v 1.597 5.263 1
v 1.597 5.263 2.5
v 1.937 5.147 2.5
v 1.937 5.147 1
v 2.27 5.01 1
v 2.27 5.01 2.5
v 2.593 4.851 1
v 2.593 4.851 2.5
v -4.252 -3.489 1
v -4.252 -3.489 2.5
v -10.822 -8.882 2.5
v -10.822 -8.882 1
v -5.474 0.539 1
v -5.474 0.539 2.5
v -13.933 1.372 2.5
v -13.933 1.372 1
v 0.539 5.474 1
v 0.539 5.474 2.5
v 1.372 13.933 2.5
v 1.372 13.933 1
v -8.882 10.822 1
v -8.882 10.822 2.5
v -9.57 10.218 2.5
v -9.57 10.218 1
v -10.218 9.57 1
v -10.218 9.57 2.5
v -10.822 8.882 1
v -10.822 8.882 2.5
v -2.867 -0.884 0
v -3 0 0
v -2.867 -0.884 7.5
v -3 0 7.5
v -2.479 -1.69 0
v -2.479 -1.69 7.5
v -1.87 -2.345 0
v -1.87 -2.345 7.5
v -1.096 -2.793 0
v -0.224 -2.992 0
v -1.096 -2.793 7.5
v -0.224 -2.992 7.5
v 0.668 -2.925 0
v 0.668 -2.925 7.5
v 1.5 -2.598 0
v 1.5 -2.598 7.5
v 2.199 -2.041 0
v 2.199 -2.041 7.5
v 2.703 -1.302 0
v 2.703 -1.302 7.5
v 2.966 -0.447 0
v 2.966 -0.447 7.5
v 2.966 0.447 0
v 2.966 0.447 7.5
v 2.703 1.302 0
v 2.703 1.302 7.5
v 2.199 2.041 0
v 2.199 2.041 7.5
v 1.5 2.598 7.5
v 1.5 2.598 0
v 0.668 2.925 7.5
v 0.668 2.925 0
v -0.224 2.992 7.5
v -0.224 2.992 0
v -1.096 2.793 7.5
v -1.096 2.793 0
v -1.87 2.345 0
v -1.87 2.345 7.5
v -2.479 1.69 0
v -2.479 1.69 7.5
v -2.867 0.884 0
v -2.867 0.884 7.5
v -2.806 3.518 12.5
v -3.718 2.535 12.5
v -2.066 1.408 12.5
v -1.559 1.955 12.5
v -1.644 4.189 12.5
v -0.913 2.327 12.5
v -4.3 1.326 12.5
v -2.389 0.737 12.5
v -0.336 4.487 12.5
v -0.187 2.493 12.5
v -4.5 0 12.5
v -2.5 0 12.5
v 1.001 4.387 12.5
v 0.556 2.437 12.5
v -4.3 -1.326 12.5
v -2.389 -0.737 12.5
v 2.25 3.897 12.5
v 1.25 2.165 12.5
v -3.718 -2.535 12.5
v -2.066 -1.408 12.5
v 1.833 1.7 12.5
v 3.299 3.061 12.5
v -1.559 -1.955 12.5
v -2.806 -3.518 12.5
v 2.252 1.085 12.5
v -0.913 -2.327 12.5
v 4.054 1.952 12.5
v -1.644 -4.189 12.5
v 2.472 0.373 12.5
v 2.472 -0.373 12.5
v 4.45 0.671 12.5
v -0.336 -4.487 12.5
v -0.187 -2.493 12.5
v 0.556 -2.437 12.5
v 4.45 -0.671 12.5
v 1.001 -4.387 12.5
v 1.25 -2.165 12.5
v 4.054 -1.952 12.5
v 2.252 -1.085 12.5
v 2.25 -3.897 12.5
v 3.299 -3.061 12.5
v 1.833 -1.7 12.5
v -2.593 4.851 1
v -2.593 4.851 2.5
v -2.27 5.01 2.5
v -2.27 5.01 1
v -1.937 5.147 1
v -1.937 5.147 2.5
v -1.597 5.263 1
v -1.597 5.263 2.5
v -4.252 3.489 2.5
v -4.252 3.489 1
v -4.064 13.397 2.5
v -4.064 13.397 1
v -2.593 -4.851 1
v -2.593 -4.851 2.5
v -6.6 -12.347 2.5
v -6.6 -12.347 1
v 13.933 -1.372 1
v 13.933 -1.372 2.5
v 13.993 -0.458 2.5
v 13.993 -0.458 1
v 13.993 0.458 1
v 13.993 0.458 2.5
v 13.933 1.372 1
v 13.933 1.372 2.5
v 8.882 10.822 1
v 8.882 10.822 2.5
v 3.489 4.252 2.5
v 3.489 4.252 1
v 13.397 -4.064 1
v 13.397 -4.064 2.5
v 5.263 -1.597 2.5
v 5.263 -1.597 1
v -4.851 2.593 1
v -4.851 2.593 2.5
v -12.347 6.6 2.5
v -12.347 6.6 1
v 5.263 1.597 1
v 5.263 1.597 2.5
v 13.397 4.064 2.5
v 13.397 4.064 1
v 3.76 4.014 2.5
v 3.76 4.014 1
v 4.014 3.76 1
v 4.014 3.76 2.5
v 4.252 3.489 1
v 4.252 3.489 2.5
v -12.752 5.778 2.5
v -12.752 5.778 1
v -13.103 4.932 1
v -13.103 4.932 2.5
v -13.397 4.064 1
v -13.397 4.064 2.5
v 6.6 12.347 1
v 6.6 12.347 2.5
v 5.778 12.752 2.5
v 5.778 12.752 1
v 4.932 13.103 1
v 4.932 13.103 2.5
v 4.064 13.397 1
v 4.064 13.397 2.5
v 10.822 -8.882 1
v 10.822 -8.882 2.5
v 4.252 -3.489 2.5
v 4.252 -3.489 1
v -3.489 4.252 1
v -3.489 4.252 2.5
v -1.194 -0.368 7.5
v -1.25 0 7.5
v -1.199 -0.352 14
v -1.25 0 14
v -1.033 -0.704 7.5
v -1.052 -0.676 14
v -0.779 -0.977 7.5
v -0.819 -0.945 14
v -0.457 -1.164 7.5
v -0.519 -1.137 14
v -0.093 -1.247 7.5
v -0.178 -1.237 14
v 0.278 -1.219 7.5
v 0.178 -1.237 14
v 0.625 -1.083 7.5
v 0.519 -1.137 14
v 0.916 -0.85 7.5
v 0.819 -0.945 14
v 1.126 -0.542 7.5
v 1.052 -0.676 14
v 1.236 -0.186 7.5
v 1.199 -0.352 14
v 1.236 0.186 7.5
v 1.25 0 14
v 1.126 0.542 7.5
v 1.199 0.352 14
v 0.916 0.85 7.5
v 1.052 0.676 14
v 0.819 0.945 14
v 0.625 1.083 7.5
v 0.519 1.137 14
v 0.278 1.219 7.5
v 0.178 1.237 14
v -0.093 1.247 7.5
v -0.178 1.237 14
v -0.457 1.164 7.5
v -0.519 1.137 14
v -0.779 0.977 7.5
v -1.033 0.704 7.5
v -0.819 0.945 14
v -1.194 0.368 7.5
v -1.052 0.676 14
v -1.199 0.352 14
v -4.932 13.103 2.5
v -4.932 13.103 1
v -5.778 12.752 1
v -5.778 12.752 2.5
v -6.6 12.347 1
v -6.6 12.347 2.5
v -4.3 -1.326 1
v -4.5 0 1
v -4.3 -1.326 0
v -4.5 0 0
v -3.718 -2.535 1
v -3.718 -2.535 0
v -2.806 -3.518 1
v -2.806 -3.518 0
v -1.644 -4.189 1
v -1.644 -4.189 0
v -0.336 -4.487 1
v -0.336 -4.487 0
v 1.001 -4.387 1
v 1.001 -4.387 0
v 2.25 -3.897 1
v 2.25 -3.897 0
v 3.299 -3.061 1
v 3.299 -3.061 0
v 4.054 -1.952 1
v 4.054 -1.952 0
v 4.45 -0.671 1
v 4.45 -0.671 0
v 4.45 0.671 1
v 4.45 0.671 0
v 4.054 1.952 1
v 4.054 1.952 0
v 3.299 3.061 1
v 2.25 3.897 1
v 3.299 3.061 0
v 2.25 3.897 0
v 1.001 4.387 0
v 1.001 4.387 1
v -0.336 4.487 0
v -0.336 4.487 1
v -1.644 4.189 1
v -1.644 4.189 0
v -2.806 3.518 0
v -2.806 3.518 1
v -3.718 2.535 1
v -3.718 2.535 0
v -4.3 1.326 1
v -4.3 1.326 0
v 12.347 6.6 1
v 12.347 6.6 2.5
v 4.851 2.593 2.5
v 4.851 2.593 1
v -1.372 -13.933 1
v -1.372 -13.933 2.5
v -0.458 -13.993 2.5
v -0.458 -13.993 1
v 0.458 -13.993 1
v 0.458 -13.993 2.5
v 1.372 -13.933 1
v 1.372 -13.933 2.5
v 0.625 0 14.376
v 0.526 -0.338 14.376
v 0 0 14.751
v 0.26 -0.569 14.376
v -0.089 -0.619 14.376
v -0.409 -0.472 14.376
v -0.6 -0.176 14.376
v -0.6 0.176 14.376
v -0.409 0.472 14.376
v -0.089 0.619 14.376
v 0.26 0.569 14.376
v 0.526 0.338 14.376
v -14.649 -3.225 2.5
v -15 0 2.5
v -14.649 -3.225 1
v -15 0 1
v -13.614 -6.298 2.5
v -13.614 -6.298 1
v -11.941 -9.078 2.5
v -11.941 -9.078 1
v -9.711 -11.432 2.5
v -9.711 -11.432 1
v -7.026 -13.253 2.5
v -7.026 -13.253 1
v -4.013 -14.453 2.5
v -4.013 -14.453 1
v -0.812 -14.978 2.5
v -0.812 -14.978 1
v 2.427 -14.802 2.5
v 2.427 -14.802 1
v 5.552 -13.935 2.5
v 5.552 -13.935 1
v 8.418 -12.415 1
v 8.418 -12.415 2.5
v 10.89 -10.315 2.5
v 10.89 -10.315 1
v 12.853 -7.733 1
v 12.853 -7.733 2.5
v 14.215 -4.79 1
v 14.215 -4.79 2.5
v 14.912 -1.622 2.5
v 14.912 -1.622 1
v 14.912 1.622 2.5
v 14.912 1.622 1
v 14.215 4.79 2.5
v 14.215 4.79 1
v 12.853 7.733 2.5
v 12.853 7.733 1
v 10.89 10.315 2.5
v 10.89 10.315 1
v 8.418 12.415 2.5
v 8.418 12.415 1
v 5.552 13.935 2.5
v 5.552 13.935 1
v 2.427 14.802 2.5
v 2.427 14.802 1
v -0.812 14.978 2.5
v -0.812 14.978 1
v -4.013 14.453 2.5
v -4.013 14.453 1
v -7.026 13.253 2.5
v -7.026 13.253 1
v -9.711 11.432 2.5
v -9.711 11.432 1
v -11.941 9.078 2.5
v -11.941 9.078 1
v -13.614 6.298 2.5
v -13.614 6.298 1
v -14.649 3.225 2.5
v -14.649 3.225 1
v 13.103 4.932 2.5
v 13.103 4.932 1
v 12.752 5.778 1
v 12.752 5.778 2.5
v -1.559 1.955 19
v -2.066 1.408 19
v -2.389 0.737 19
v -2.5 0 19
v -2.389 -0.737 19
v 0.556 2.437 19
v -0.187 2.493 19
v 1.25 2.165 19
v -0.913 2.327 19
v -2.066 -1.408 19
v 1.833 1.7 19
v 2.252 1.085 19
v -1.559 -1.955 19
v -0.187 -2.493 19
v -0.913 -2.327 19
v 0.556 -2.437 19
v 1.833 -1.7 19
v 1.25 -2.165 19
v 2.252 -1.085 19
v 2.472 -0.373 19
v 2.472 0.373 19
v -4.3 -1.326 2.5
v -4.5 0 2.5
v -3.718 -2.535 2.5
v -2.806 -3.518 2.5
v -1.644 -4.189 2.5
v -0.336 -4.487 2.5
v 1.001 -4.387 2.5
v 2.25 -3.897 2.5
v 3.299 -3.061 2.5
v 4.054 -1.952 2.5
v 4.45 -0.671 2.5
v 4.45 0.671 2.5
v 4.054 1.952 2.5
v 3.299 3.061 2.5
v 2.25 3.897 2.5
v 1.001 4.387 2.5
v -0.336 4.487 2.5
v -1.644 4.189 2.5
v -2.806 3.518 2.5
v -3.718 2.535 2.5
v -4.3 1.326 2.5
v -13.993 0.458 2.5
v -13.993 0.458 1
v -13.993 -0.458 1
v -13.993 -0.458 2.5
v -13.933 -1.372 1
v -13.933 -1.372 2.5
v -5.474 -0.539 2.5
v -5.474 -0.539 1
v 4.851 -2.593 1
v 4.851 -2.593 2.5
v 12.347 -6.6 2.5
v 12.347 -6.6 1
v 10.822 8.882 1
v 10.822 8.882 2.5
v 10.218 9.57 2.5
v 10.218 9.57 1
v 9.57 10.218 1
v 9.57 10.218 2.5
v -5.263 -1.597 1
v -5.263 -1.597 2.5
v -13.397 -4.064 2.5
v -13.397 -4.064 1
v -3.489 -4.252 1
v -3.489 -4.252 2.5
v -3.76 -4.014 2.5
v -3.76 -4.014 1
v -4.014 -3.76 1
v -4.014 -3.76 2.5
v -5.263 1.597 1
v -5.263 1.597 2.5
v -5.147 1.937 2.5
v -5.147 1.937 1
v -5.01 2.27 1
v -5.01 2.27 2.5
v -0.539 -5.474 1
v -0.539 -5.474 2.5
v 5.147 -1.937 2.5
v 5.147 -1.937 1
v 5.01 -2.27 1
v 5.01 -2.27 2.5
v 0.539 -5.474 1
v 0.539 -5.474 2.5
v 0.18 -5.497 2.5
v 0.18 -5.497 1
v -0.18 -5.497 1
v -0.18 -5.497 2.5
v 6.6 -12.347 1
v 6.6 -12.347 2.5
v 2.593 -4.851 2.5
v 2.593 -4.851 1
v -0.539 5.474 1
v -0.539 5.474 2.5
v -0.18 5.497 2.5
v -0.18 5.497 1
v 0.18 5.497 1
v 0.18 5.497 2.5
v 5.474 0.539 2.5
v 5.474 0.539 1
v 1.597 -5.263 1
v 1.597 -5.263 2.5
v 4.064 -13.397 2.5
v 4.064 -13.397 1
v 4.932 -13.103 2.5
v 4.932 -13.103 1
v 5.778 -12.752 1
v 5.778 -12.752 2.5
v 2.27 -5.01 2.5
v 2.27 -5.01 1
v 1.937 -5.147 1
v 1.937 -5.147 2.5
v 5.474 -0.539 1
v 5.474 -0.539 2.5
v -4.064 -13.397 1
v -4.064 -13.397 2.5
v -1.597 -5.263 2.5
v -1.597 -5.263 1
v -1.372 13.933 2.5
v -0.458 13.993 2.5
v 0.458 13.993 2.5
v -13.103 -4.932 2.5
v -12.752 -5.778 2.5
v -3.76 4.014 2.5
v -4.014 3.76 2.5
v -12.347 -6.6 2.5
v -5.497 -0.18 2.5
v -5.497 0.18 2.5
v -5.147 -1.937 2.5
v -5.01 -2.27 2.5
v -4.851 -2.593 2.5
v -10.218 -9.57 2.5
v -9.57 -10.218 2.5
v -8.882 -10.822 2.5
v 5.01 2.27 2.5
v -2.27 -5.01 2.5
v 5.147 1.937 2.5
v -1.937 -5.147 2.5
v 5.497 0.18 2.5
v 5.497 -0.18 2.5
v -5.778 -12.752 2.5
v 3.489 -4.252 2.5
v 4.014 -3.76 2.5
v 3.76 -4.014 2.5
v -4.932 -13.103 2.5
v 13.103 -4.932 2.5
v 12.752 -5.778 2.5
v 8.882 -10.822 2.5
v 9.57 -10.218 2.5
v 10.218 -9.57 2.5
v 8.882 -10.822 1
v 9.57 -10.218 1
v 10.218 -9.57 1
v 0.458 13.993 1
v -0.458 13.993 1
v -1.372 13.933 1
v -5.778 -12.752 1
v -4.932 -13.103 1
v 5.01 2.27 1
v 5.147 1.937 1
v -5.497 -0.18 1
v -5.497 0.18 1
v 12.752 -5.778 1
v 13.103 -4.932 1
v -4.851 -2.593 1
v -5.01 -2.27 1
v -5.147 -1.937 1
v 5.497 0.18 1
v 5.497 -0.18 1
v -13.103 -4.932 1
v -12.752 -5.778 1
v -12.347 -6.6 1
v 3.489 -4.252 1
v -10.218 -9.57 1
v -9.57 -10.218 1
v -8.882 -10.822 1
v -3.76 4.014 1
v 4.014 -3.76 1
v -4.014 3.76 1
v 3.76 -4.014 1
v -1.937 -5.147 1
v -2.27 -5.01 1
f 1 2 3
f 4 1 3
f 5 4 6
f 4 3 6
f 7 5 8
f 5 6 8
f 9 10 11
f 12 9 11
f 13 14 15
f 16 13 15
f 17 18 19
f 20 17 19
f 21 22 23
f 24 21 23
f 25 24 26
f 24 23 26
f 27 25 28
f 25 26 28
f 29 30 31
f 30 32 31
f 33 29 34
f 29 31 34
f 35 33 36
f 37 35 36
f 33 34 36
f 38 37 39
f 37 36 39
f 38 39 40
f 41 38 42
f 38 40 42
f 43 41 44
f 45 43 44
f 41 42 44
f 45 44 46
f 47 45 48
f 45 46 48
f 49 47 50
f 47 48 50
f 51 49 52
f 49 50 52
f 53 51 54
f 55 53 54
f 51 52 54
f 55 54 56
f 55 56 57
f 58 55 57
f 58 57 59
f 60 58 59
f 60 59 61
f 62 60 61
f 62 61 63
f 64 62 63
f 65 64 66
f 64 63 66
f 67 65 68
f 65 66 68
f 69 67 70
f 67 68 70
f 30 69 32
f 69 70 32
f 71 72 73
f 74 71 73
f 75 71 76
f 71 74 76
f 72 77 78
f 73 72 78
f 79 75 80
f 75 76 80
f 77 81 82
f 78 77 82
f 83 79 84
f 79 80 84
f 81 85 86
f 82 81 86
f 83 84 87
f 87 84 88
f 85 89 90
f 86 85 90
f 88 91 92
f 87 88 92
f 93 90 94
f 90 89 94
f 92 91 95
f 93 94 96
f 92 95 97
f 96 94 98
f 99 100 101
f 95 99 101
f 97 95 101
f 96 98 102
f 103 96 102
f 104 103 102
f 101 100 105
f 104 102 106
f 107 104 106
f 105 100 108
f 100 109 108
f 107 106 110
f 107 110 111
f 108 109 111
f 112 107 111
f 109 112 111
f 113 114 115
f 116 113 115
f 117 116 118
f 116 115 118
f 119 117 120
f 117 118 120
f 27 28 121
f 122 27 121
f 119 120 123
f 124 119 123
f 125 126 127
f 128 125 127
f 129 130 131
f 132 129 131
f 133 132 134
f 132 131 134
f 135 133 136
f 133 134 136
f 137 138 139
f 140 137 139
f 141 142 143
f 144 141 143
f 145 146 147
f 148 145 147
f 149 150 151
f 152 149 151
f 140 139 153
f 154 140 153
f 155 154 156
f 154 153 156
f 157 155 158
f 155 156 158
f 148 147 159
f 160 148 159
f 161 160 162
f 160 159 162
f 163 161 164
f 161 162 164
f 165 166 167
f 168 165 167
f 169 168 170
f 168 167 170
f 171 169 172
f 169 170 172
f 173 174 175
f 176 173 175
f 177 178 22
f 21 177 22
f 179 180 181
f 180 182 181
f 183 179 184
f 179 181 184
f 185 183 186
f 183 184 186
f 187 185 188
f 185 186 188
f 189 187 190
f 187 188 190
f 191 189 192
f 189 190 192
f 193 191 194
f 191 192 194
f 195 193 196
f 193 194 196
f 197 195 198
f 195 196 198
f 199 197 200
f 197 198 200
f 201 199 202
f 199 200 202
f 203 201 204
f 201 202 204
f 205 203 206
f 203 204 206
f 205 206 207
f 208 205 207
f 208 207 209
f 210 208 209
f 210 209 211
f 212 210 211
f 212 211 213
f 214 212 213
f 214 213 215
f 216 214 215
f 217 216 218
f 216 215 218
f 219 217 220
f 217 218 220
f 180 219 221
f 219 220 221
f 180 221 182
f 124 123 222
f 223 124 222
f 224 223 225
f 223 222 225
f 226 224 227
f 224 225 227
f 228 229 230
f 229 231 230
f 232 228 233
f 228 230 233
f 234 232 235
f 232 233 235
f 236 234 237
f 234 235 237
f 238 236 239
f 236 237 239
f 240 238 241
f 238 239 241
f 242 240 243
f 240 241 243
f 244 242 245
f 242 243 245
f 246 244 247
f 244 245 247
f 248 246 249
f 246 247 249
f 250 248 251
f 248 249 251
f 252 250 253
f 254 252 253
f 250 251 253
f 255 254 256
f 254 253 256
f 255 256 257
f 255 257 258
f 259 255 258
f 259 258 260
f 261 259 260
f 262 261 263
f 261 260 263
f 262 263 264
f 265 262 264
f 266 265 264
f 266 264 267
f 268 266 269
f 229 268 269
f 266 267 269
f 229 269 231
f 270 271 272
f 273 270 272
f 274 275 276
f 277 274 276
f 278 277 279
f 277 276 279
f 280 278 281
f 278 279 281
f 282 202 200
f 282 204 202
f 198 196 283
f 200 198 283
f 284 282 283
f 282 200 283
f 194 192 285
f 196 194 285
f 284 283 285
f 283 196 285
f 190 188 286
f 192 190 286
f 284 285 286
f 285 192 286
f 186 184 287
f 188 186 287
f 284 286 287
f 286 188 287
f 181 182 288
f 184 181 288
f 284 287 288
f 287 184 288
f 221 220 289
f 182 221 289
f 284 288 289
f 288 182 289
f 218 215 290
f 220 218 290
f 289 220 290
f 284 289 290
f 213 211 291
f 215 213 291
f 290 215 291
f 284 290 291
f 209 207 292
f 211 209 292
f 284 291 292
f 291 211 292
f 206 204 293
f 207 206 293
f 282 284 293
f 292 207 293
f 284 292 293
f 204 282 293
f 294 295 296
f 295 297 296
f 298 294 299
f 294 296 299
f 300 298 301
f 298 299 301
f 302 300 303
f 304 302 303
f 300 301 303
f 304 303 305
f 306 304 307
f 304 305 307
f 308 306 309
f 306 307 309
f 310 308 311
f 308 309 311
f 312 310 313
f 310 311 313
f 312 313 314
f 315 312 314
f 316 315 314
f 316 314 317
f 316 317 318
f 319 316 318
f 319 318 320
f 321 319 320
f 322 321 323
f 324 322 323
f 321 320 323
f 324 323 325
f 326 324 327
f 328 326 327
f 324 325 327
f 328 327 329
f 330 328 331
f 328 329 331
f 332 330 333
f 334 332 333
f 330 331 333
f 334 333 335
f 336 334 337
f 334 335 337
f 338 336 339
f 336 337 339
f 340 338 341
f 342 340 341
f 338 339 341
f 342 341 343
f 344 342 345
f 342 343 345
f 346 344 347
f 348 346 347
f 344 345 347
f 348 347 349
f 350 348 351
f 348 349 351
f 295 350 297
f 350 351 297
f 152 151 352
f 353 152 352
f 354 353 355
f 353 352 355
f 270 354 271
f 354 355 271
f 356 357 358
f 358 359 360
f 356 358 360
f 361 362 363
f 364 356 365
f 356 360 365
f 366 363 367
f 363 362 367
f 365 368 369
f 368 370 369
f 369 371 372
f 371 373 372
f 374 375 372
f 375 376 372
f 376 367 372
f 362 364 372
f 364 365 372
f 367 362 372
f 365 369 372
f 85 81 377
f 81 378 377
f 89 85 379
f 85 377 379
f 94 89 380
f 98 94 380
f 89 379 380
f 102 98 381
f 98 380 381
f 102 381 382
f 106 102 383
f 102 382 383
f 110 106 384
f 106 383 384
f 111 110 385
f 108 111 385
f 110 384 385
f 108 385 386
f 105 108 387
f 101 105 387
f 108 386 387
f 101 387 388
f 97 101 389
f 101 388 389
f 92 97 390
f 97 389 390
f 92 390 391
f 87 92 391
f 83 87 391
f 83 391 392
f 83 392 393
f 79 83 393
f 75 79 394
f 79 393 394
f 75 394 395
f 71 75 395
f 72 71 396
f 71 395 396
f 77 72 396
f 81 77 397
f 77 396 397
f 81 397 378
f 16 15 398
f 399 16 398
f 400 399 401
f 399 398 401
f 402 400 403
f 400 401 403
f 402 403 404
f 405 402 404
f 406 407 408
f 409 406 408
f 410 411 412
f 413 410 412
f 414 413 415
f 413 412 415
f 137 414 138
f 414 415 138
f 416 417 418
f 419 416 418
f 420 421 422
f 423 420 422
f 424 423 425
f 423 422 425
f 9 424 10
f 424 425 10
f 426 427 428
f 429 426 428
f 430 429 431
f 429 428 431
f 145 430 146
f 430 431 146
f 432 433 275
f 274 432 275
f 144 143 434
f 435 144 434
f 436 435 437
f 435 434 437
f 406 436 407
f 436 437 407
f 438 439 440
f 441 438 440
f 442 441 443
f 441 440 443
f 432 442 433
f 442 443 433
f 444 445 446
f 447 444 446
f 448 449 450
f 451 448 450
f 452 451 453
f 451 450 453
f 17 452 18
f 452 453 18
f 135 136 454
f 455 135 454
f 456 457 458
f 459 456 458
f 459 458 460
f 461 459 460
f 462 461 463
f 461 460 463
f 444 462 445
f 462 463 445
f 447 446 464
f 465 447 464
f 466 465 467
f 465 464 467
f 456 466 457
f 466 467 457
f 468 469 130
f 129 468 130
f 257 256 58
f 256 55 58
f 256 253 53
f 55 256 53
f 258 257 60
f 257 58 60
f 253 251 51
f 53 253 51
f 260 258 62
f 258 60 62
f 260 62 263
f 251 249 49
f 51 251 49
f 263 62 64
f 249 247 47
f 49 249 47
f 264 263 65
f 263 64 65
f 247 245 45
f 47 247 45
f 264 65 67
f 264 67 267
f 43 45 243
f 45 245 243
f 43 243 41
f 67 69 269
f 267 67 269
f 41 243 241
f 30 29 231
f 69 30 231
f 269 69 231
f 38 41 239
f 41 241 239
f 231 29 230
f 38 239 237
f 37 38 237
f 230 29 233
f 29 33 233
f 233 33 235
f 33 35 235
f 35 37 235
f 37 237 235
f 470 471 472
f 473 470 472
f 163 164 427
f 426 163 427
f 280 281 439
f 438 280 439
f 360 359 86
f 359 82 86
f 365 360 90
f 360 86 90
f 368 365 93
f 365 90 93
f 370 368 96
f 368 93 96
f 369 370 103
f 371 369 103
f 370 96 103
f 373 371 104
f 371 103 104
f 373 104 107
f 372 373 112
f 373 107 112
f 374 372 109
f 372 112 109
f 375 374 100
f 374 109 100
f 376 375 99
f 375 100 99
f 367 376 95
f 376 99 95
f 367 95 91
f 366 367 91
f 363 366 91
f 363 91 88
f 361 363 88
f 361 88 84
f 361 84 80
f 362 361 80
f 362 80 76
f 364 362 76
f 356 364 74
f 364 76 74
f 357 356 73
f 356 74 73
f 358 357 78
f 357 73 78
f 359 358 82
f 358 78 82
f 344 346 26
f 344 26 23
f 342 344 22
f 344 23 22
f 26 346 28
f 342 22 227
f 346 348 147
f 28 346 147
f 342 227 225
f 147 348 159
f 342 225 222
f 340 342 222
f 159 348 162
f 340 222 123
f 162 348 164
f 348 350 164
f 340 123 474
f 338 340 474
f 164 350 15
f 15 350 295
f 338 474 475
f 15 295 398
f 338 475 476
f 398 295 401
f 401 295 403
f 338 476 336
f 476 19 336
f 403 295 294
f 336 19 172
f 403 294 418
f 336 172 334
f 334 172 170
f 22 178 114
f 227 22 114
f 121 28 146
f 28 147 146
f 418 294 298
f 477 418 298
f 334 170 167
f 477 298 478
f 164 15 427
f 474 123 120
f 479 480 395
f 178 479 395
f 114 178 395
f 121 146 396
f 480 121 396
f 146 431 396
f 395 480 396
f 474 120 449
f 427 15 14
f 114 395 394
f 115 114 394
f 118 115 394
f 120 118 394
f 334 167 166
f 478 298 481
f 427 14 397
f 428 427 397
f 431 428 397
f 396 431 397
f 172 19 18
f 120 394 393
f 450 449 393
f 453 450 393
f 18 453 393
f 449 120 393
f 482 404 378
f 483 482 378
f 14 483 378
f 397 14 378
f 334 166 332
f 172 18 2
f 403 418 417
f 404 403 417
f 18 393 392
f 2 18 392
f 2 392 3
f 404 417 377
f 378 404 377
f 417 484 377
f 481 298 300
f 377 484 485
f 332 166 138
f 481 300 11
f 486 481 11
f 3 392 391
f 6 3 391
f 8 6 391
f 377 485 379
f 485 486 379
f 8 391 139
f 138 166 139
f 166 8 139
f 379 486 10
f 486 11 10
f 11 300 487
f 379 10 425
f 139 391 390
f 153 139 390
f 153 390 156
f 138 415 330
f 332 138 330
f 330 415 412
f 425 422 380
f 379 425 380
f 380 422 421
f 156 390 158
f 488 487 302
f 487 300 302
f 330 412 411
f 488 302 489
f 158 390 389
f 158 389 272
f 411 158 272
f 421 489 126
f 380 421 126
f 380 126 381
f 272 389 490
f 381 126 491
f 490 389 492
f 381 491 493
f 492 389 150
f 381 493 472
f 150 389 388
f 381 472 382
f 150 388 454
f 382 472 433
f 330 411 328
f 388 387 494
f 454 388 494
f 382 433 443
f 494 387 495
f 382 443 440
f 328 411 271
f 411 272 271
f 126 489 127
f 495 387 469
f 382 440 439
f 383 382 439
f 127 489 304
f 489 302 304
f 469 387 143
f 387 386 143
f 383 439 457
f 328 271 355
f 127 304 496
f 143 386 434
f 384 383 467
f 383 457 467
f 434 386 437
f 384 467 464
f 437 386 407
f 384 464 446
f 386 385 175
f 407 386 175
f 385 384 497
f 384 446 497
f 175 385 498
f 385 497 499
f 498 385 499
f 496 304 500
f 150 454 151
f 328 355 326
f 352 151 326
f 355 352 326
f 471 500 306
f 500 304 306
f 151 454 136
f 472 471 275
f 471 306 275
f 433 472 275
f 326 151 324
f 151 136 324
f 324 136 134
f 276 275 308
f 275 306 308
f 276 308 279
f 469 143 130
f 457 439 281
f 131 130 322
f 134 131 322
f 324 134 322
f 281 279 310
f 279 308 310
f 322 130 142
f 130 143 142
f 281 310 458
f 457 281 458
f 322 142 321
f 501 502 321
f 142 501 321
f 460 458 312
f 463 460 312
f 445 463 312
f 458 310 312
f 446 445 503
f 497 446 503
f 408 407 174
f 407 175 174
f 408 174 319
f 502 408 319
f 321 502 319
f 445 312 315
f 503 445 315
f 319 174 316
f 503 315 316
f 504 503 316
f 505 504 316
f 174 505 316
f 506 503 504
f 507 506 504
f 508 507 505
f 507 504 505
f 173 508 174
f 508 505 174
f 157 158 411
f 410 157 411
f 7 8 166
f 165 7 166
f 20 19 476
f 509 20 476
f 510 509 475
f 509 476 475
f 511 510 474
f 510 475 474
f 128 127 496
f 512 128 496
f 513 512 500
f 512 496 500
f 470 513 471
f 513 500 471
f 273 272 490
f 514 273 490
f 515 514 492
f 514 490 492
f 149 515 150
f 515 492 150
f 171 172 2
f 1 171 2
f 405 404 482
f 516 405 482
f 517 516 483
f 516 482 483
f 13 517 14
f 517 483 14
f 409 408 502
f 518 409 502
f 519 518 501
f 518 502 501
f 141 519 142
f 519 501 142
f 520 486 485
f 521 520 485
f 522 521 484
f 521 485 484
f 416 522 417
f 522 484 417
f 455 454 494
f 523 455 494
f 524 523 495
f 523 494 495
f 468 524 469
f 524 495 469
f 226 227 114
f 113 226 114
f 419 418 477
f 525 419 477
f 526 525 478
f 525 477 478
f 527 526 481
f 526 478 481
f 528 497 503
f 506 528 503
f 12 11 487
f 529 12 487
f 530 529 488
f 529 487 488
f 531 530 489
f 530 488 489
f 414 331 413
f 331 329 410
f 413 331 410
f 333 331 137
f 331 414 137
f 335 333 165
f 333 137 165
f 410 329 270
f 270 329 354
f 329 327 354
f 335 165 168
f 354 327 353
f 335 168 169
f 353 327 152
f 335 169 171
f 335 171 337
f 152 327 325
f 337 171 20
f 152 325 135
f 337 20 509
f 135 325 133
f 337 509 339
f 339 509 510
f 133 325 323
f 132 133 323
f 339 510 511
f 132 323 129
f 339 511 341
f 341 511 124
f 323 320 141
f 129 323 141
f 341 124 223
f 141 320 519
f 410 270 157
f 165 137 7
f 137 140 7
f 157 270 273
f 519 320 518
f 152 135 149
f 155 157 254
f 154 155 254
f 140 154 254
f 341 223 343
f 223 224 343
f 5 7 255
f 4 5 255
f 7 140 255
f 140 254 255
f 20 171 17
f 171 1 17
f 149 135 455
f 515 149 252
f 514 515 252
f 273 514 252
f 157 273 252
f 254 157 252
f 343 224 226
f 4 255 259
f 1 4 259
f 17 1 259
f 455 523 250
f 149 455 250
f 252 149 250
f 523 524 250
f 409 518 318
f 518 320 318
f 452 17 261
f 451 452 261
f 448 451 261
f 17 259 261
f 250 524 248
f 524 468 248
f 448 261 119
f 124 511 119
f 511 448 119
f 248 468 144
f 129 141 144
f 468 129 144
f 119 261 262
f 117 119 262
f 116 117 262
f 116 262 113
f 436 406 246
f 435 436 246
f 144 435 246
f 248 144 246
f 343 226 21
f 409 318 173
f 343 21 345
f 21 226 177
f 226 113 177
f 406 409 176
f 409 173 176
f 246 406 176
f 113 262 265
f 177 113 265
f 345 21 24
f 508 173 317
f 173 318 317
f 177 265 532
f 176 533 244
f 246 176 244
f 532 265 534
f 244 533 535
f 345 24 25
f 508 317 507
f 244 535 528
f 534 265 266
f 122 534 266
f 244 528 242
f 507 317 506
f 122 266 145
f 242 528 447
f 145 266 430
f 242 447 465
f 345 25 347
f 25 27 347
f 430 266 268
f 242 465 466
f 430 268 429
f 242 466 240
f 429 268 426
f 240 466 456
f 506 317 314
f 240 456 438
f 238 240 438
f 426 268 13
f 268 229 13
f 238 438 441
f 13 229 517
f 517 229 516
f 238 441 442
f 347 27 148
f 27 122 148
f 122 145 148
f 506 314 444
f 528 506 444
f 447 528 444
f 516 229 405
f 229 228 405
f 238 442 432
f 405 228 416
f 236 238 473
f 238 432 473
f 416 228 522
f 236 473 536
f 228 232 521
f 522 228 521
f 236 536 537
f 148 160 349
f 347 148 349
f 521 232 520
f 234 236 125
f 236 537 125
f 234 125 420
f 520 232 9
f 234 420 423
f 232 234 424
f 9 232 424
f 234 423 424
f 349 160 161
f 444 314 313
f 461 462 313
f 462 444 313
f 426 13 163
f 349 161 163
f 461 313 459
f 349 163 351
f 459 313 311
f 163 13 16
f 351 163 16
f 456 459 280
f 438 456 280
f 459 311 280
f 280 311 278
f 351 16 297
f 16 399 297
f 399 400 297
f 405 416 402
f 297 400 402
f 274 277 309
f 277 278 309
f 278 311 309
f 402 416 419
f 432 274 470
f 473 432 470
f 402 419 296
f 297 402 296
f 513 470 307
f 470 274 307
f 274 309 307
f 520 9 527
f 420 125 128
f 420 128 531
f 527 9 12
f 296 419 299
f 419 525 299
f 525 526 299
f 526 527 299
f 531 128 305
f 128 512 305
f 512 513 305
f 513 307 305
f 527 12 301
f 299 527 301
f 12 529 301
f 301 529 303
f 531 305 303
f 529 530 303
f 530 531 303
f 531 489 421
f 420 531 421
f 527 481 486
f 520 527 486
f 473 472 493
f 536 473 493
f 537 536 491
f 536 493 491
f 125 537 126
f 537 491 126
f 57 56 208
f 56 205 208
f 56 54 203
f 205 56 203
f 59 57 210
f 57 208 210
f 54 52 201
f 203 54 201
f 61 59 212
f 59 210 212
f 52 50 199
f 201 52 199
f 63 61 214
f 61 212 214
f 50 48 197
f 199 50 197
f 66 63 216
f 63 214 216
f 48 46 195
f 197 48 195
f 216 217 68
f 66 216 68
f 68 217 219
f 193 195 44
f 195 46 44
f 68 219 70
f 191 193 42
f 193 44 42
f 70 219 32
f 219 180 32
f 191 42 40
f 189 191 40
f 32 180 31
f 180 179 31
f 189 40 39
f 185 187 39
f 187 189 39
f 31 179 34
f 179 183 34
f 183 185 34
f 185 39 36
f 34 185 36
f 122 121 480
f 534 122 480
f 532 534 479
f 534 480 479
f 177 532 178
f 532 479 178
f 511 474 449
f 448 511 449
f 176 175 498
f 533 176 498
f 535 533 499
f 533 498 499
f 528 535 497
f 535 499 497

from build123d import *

# Parameters (mm, degrees)
F3_D            = 2.5
F3_DEPTH        = 6.5
F3_TIP          = 0.7510757738
F5_DEPTH        = 2.501
F5_COPIES_COUNT = 16


# Not quite as in the source:
# - a pattern or mirror of a feature is missing from the dataset's text; its kind, count and spacing are read off the source's solid


with BuildPart() as f1:
    # F0 (on Front) → F1 (revolve)
    with BuildSketch(Plane.XZ):
        Polygon((-4.5, 0), (-3, 0), (-3, 7.5), (0, 7.5), (0, 19), (-2.5, 19), (-2.5, 12.5), (-4.5, 12.5), (-4.5, 2.5), (-15, 2.5), (-15, 1), (-4.5, 1), align=None)
    revolve(axis=Axis((0, 0, 13.1862424314), (0, 0, 1)))

    # F3
    with Locations(Plane(origin=(0, 0, 7.5), x_dir=(1, 0, 0), z_dir=(0, 0, -1))):
        with Locations((0, 0)):
            Hole(F3_D / 2, depth=F3_DEPTH)
            with Locations((0, 0, -(F3_DEPTH + F3_TIP / 2))):  # 118° drill point
                Cone(0, F3_D / 2, F3_TIP, mode=Mode.SUBTRACT)

    # F4 (on face) → F5 (cut, through all)
    with BuildSketch(Plane.XY.offset(2.5)):
        with BuildLine():
            Line((-1.3722399646, 13.9325861734), (-0.5390942718, 5.4735159967))
            ThreePointArc((-0.5390942718, 5.4735159967), (0, 5.5), (0.5390942718, 5.4735159967))
            Line((0.5390942718, 5.4735159967), (1.3722399646, 13.9325861734))
            ThreePointArc((1.3722399646, 13.9325861734), (0, 14), (-1.3722399646, 13.9325861734))
        make_face()
    f5 = extrude(amount=-F5_DEPTH, mode=Mode.SUBTRACT)

    # F5_copies: F5 ×16 about axis
    f5_copies_axis = Axis((0, 0, 0), (0, 0, 1))
    for i in range(1, F5_COPIES_COUNT):
        add(f5.rotate(f5_copies_axis, i * 360 / F5_COPIES_COUNT), mode=Mode.SUBTRACT)


solid = f1.part
